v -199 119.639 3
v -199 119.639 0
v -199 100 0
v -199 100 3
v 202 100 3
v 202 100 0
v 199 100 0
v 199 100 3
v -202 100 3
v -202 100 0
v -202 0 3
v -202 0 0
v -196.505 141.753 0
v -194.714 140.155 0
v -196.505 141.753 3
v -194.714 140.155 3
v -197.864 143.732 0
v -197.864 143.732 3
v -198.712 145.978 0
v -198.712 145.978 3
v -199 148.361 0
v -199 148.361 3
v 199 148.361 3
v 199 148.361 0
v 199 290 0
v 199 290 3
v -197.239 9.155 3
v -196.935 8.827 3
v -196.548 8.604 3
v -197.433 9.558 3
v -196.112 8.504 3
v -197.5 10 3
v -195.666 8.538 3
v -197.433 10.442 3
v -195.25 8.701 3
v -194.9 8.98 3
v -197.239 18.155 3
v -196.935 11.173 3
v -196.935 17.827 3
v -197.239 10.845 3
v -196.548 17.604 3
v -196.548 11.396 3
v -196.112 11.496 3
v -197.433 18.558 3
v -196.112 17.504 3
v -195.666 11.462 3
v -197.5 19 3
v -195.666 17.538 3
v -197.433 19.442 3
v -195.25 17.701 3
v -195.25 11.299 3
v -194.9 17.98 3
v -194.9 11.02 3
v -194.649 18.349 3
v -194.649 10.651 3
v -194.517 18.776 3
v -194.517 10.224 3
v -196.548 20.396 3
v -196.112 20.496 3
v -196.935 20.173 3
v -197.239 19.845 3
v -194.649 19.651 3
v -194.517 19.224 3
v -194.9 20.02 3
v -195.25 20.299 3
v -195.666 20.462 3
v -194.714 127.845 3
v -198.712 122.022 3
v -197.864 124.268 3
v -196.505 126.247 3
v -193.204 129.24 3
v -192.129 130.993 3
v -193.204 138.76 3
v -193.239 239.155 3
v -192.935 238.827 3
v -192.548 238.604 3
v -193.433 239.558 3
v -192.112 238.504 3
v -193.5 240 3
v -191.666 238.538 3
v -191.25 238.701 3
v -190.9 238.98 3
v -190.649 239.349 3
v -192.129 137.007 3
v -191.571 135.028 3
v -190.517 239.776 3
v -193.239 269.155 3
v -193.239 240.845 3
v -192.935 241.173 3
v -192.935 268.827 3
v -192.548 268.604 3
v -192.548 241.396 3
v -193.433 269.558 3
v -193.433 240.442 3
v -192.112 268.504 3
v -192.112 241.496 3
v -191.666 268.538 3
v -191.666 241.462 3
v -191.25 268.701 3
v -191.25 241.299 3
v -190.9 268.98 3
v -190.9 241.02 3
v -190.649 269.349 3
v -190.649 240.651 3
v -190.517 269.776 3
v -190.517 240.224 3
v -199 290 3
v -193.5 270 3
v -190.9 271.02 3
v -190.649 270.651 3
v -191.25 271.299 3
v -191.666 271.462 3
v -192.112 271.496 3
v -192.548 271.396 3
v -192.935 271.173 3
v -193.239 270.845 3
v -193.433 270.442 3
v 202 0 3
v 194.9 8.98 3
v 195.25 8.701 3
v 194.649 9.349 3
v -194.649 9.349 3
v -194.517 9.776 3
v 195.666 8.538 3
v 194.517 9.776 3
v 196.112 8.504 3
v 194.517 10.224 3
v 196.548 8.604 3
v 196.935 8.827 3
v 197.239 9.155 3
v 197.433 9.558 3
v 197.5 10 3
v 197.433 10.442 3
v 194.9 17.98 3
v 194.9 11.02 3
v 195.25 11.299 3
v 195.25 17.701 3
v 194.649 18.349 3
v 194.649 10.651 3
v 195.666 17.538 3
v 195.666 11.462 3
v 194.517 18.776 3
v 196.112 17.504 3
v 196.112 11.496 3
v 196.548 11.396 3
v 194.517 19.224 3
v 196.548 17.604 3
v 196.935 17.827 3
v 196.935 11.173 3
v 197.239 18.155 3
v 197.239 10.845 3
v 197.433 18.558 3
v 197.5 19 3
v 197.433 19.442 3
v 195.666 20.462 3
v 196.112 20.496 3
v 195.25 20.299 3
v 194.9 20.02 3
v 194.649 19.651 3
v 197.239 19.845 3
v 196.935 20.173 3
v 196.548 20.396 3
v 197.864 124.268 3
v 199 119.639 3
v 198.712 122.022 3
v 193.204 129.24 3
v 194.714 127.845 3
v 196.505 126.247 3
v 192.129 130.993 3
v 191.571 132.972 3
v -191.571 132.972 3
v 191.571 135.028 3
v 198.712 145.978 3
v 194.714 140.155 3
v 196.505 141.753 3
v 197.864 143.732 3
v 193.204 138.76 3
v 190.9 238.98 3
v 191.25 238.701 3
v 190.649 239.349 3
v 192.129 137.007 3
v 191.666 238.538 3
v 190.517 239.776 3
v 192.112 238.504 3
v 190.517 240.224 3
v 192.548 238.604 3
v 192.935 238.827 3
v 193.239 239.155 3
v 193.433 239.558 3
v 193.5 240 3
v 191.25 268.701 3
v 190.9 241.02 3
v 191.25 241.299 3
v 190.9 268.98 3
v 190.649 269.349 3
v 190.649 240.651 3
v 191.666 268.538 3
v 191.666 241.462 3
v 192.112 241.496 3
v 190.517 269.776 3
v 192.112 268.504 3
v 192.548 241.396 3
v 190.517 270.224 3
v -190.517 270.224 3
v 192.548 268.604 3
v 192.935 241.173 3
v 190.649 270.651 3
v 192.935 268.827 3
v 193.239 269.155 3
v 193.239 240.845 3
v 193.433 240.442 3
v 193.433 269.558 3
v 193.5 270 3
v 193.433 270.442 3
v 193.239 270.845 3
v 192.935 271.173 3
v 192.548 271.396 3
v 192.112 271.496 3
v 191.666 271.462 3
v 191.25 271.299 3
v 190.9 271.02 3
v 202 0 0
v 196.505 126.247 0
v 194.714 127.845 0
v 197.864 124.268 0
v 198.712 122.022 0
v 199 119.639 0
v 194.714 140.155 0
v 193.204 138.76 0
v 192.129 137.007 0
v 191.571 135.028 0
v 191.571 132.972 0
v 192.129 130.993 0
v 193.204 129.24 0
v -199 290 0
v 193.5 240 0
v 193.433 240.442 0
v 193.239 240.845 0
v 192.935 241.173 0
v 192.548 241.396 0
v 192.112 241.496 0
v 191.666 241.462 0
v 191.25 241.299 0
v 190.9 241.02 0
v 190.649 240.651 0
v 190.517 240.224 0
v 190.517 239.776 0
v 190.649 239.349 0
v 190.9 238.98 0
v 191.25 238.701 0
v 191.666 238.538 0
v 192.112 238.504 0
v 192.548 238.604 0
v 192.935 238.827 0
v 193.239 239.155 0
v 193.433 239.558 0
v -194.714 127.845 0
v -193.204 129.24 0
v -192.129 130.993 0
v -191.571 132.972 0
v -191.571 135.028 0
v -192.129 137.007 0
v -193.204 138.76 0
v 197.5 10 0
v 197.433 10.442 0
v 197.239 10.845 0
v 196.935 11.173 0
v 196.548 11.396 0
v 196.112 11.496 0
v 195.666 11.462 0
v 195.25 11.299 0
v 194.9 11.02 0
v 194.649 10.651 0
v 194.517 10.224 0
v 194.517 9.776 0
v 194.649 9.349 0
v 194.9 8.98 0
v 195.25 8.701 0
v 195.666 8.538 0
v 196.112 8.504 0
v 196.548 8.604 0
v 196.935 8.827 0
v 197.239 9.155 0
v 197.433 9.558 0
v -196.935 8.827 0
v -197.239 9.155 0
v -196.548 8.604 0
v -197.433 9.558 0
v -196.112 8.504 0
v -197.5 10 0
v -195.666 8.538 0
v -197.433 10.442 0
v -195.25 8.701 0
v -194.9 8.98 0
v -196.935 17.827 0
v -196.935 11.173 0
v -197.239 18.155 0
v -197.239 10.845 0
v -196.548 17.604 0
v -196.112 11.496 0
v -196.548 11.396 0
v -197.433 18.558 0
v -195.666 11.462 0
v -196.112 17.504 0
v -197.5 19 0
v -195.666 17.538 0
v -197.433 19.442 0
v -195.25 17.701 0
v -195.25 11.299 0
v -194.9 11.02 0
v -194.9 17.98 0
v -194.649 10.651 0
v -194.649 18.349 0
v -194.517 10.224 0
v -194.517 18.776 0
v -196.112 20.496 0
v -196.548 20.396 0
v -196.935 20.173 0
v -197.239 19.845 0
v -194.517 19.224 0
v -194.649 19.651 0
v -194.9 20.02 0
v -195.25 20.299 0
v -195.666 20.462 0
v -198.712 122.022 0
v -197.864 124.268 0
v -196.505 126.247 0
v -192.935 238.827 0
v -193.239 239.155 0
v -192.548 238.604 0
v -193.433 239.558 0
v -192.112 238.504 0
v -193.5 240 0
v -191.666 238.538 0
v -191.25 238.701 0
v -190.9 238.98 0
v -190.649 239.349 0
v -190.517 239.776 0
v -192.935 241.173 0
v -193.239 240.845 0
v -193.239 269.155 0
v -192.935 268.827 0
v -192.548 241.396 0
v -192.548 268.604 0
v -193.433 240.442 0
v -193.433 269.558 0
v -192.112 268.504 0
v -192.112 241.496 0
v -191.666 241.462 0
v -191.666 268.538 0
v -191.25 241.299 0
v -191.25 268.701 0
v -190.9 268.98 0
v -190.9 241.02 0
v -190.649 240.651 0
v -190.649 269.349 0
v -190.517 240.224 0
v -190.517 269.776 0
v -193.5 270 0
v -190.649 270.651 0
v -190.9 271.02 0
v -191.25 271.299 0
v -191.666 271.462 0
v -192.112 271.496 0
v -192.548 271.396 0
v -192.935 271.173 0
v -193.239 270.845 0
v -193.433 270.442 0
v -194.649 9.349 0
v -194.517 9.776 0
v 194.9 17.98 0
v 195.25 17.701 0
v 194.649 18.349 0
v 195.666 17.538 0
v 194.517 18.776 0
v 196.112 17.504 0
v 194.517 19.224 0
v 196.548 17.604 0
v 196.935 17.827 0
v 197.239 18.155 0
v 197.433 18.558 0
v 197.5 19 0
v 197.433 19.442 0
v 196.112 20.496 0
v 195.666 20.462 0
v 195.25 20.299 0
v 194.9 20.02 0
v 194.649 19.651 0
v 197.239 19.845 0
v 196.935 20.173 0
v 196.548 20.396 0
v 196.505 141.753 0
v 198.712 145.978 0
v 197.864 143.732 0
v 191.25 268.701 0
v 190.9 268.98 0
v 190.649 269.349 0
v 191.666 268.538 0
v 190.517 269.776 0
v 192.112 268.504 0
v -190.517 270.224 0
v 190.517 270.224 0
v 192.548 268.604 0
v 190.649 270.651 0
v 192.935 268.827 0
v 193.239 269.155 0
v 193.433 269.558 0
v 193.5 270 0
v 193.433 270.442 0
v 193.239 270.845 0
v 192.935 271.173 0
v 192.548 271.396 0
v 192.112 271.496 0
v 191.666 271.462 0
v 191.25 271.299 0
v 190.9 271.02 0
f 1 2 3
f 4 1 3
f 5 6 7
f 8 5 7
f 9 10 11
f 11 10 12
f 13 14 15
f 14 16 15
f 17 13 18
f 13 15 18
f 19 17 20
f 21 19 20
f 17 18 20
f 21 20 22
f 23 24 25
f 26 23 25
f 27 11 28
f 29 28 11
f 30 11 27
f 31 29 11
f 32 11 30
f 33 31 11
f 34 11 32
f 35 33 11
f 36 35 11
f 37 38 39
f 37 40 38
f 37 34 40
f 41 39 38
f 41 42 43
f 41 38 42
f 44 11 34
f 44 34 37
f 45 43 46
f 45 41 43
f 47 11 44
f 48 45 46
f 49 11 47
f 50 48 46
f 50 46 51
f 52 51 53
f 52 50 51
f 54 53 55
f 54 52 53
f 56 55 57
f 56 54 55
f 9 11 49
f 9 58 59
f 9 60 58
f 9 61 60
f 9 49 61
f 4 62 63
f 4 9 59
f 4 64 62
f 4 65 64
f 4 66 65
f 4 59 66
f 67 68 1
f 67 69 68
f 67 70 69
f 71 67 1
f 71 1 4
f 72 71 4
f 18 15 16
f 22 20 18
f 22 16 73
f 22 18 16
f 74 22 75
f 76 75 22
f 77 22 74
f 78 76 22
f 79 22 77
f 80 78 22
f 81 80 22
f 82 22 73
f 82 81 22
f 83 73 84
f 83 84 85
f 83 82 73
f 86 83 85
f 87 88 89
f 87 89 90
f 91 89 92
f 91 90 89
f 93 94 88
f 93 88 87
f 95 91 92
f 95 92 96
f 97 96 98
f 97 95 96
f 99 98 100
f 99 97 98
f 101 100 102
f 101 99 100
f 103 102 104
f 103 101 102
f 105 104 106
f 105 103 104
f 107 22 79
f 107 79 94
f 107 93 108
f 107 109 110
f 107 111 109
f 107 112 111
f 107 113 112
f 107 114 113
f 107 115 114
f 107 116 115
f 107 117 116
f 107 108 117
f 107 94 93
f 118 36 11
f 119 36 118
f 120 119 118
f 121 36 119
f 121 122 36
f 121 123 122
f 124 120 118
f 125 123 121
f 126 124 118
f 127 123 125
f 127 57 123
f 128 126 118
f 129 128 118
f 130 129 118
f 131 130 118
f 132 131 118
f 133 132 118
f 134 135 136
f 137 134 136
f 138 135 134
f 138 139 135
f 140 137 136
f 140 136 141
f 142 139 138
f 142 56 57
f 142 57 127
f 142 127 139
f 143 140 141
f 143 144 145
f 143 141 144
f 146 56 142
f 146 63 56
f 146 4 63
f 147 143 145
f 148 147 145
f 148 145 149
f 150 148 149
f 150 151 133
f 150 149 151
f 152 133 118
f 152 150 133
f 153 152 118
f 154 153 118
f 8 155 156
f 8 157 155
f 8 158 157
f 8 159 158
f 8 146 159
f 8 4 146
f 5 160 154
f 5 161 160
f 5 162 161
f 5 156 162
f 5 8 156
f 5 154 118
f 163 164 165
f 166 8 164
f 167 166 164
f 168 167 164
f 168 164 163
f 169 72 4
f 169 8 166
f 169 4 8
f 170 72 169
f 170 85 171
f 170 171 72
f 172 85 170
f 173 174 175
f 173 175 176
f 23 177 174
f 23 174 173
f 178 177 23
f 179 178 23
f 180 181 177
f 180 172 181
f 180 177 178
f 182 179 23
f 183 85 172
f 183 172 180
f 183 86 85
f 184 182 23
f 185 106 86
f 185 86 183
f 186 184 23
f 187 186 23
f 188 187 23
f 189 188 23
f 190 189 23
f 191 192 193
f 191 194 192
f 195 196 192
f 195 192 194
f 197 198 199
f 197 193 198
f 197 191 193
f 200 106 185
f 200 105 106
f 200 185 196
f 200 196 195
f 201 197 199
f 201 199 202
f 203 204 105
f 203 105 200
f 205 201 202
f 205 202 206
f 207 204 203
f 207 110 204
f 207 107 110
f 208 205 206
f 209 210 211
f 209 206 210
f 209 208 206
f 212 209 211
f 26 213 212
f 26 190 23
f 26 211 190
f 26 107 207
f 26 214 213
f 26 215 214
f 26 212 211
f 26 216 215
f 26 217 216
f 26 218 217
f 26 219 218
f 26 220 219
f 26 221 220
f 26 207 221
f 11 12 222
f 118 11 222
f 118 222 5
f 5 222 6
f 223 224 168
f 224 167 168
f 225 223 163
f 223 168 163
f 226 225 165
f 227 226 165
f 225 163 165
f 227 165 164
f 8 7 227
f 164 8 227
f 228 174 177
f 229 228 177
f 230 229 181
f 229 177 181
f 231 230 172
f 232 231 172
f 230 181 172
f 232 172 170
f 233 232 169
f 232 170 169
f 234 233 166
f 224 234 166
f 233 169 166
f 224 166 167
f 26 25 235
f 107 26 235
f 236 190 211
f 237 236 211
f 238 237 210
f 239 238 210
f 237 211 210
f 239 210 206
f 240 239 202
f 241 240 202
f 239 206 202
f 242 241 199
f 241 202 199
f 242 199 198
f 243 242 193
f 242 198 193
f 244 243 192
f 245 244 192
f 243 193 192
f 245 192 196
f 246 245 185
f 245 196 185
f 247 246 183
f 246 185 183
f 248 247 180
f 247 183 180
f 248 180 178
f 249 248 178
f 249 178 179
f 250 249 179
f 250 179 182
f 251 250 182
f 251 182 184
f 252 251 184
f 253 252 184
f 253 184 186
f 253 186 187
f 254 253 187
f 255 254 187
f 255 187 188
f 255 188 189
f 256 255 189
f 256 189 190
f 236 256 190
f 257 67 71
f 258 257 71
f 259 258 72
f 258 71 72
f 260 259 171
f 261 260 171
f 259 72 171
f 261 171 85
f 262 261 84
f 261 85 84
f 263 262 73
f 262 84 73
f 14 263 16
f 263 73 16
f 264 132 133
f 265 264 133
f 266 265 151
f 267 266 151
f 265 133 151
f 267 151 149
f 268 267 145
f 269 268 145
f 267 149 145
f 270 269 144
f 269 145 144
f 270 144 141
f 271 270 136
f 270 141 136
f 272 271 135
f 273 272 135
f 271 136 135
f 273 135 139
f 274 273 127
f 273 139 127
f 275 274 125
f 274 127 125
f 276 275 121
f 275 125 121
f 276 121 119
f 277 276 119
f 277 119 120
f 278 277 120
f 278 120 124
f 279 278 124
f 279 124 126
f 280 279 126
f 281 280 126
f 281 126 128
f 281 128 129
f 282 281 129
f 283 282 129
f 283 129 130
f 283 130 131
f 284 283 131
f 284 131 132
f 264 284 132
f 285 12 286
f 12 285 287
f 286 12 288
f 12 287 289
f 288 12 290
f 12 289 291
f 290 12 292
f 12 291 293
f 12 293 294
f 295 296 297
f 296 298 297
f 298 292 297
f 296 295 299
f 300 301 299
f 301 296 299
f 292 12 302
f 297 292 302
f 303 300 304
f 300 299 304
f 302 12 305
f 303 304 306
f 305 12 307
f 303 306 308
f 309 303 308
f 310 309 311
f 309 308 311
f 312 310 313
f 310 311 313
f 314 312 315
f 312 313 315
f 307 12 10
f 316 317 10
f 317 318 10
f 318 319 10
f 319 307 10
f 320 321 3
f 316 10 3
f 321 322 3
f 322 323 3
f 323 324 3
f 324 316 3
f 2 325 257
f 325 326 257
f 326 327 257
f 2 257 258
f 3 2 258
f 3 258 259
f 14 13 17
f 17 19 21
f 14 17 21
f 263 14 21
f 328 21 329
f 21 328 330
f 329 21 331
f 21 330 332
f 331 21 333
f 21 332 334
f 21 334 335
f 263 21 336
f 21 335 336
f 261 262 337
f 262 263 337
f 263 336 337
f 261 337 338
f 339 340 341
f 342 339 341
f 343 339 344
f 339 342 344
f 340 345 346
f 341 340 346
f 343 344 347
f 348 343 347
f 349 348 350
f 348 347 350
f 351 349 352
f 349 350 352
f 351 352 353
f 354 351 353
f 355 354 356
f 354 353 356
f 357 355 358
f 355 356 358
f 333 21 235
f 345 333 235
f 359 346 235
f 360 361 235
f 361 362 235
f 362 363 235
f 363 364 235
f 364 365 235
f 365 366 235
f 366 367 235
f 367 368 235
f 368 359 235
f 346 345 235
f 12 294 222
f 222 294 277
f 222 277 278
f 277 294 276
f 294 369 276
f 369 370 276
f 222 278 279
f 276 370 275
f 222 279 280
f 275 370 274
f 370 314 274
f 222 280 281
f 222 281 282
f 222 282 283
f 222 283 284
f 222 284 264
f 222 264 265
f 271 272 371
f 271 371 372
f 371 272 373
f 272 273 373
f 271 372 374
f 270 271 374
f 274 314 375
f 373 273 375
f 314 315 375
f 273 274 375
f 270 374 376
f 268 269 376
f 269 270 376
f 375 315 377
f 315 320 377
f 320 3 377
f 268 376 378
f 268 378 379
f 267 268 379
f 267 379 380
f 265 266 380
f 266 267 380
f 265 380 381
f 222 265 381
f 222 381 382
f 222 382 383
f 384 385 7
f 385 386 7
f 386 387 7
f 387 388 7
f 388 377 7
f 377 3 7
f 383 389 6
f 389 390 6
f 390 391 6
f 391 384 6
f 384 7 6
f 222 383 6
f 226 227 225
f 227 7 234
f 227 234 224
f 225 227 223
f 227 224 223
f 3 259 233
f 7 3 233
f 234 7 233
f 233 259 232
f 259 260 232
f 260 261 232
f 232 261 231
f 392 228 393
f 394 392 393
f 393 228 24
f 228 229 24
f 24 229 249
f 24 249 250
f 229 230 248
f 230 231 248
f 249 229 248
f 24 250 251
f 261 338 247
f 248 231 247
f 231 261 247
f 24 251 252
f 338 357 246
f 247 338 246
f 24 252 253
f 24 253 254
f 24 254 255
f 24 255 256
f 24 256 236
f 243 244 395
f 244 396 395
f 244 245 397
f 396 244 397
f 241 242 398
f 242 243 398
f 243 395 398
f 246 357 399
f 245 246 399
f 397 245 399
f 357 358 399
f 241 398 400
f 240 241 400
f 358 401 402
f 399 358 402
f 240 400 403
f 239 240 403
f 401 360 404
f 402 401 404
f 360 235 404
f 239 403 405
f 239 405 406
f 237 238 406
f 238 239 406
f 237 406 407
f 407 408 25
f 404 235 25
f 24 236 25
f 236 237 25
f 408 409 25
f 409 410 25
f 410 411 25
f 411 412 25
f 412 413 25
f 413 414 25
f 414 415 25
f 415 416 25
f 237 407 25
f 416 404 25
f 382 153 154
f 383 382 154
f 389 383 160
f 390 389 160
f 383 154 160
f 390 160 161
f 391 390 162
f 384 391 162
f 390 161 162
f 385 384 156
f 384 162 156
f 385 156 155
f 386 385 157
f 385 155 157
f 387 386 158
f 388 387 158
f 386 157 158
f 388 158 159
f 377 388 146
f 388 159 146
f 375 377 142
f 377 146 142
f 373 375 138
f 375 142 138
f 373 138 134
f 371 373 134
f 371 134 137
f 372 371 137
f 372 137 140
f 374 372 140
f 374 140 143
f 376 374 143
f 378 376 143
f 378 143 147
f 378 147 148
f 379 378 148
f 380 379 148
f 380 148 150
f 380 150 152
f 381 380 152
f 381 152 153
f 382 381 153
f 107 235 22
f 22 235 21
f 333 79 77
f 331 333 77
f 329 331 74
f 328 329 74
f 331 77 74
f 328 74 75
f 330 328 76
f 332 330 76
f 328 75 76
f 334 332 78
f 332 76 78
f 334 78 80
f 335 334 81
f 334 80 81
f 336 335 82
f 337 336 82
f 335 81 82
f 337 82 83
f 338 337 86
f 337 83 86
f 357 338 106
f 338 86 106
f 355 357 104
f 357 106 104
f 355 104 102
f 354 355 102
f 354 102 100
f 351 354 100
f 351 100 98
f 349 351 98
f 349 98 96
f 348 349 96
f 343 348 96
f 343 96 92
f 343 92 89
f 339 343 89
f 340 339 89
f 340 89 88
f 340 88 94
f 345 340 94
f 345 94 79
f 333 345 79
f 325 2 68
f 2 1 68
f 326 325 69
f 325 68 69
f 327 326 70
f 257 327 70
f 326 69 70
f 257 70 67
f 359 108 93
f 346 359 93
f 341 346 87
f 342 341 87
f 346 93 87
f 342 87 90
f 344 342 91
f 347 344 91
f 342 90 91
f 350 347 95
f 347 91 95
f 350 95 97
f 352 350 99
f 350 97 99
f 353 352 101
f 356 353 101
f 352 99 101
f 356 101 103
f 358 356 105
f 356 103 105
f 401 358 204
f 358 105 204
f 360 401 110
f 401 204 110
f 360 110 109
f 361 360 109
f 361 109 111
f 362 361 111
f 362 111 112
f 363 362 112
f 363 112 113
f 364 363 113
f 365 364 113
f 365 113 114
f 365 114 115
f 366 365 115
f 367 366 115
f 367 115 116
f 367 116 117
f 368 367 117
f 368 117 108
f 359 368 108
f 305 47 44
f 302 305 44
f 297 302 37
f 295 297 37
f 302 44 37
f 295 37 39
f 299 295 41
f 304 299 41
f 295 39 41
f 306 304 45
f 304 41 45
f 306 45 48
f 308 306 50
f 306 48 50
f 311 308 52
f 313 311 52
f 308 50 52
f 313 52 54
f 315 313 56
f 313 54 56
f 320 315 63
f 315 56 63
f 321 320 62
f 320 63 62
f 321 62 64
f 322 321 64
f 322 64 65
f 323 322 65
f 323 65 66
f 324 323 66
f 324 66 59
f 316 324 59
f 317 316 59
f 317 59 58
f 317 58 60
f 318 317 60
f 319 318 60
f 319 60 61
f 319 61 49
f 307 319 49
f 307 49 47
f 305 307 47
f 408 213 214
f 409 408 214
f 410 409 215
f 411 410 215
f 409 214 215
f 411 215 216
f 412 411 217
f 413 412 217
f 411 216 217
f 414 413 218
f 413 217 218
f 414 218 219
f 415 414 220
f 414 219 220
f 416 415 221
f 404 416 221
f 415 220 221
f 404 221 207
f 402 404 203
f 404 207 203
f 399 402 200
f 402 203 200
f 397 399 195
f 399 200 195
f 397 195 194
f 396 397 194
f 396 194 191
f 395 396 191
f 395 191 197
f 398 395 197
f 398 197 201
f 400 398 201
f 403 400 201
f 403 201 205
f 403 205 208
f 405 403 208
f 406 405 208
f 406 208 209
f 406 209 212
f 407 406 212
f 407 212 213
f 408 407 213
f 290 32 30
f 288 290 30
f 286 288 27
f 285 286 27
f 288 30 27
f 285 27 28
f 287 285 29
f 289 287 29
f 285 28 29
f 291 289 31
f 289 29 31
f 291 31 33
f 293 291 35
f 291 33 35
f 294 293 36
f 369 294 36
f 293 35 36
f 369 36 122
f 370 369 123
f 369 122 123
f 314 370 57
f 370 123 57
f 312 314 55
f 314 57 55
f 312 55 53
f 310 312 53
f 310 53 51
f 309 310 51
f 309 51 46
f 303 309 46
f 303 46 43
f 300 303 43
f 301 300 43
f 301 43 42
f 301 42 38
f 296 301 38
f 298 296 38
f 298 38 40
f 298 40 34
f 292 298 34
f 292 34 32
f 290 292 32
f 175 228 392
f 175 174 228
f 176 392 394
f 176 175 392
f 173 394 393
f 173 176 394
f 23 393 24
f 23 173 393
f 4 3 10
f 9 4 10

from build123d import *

# Parameters (mm, degrees)
EXTRUDE_1_DEPTH     = 3
SKETCH_2_R          = 1.5
CUT_EXTRUDE_1_DEPTH = 354.430332598
SKETCH_3_R          = 7.5
CUT_EXTRUDE_2_DEPTH = 354.430332598
FILLET_1_R          = 10


with BuildPart() as part:
    # 草图1 → 凸台-拉伸1 (new body)
    with BuildSketch(Plane.XY):
        Polygon((199, 290), (-199, 290), (-199, 100), (-202, 100), (-202, 0), (202, 0), (202, 100), (199, 100), align=None)
    extrude(amount=EXTRUDE_1_DEPTH)

    # 草图2 → 切除-拉伸1 (cut, through all)
    with BuildSketch(Plane.XY.offset(3)):
        with Locations((192, 270)):
            Circle(SKETCH_2_R)
        with Locations((192, 240)):
            Circle(SKETCH_2_R)
        with Locations(Location((-192, 240, 0), (0, 0, 180))):
            Circle(SKETCH_2_R)
        with Locations(Location((-192, 270, 0), (0, 0, 180))):
            Circle(SKETCH_2_R)
        with Locations((196, 19)):
            Circle(SKETCH_2_R)
        with Locations((196, 10)):
            Circle(SKETCH_2_R)
        with Locations(Location((-196, 10, 0), (0, 0, 180))):
            Circle(SKETCH_2_R)
        with Locations(Location((-196, 19, 0), (0, 0, 180))):
            Circle(SKETCH_2_R)
    extrude(amount=-CUT_EXTRUDE_1_DEPTH, mode=Mode.SUBTRACT)

    # 草图3 → 切除-拉伸2 (cut, through all)
    with BuildSketch(Plane.XY.offset(3)):
        with Locations((199, 134)):
            Circle(SKETCH_3_R)
        with Locations((-199, 134)):
            Circle(SKETCH_3_R)
    extrude(amount=-CUT_EXTRUDE_2_DEPTH, mode=Mode.SUBTRACT)

    # 圆角1
    fillet_1_edges = [part.edges().sort_by_distance(p)[0] for p in [
        (199, 126.5, 1.5),
        (199, 141.5, 1.5),
        (-199, 141.5, 1.5),
        (-199, 126.5, 1.5),
    ]]
    fillet(fillet_1_edges, radius=FILLET_1_R)


solid = part.part
